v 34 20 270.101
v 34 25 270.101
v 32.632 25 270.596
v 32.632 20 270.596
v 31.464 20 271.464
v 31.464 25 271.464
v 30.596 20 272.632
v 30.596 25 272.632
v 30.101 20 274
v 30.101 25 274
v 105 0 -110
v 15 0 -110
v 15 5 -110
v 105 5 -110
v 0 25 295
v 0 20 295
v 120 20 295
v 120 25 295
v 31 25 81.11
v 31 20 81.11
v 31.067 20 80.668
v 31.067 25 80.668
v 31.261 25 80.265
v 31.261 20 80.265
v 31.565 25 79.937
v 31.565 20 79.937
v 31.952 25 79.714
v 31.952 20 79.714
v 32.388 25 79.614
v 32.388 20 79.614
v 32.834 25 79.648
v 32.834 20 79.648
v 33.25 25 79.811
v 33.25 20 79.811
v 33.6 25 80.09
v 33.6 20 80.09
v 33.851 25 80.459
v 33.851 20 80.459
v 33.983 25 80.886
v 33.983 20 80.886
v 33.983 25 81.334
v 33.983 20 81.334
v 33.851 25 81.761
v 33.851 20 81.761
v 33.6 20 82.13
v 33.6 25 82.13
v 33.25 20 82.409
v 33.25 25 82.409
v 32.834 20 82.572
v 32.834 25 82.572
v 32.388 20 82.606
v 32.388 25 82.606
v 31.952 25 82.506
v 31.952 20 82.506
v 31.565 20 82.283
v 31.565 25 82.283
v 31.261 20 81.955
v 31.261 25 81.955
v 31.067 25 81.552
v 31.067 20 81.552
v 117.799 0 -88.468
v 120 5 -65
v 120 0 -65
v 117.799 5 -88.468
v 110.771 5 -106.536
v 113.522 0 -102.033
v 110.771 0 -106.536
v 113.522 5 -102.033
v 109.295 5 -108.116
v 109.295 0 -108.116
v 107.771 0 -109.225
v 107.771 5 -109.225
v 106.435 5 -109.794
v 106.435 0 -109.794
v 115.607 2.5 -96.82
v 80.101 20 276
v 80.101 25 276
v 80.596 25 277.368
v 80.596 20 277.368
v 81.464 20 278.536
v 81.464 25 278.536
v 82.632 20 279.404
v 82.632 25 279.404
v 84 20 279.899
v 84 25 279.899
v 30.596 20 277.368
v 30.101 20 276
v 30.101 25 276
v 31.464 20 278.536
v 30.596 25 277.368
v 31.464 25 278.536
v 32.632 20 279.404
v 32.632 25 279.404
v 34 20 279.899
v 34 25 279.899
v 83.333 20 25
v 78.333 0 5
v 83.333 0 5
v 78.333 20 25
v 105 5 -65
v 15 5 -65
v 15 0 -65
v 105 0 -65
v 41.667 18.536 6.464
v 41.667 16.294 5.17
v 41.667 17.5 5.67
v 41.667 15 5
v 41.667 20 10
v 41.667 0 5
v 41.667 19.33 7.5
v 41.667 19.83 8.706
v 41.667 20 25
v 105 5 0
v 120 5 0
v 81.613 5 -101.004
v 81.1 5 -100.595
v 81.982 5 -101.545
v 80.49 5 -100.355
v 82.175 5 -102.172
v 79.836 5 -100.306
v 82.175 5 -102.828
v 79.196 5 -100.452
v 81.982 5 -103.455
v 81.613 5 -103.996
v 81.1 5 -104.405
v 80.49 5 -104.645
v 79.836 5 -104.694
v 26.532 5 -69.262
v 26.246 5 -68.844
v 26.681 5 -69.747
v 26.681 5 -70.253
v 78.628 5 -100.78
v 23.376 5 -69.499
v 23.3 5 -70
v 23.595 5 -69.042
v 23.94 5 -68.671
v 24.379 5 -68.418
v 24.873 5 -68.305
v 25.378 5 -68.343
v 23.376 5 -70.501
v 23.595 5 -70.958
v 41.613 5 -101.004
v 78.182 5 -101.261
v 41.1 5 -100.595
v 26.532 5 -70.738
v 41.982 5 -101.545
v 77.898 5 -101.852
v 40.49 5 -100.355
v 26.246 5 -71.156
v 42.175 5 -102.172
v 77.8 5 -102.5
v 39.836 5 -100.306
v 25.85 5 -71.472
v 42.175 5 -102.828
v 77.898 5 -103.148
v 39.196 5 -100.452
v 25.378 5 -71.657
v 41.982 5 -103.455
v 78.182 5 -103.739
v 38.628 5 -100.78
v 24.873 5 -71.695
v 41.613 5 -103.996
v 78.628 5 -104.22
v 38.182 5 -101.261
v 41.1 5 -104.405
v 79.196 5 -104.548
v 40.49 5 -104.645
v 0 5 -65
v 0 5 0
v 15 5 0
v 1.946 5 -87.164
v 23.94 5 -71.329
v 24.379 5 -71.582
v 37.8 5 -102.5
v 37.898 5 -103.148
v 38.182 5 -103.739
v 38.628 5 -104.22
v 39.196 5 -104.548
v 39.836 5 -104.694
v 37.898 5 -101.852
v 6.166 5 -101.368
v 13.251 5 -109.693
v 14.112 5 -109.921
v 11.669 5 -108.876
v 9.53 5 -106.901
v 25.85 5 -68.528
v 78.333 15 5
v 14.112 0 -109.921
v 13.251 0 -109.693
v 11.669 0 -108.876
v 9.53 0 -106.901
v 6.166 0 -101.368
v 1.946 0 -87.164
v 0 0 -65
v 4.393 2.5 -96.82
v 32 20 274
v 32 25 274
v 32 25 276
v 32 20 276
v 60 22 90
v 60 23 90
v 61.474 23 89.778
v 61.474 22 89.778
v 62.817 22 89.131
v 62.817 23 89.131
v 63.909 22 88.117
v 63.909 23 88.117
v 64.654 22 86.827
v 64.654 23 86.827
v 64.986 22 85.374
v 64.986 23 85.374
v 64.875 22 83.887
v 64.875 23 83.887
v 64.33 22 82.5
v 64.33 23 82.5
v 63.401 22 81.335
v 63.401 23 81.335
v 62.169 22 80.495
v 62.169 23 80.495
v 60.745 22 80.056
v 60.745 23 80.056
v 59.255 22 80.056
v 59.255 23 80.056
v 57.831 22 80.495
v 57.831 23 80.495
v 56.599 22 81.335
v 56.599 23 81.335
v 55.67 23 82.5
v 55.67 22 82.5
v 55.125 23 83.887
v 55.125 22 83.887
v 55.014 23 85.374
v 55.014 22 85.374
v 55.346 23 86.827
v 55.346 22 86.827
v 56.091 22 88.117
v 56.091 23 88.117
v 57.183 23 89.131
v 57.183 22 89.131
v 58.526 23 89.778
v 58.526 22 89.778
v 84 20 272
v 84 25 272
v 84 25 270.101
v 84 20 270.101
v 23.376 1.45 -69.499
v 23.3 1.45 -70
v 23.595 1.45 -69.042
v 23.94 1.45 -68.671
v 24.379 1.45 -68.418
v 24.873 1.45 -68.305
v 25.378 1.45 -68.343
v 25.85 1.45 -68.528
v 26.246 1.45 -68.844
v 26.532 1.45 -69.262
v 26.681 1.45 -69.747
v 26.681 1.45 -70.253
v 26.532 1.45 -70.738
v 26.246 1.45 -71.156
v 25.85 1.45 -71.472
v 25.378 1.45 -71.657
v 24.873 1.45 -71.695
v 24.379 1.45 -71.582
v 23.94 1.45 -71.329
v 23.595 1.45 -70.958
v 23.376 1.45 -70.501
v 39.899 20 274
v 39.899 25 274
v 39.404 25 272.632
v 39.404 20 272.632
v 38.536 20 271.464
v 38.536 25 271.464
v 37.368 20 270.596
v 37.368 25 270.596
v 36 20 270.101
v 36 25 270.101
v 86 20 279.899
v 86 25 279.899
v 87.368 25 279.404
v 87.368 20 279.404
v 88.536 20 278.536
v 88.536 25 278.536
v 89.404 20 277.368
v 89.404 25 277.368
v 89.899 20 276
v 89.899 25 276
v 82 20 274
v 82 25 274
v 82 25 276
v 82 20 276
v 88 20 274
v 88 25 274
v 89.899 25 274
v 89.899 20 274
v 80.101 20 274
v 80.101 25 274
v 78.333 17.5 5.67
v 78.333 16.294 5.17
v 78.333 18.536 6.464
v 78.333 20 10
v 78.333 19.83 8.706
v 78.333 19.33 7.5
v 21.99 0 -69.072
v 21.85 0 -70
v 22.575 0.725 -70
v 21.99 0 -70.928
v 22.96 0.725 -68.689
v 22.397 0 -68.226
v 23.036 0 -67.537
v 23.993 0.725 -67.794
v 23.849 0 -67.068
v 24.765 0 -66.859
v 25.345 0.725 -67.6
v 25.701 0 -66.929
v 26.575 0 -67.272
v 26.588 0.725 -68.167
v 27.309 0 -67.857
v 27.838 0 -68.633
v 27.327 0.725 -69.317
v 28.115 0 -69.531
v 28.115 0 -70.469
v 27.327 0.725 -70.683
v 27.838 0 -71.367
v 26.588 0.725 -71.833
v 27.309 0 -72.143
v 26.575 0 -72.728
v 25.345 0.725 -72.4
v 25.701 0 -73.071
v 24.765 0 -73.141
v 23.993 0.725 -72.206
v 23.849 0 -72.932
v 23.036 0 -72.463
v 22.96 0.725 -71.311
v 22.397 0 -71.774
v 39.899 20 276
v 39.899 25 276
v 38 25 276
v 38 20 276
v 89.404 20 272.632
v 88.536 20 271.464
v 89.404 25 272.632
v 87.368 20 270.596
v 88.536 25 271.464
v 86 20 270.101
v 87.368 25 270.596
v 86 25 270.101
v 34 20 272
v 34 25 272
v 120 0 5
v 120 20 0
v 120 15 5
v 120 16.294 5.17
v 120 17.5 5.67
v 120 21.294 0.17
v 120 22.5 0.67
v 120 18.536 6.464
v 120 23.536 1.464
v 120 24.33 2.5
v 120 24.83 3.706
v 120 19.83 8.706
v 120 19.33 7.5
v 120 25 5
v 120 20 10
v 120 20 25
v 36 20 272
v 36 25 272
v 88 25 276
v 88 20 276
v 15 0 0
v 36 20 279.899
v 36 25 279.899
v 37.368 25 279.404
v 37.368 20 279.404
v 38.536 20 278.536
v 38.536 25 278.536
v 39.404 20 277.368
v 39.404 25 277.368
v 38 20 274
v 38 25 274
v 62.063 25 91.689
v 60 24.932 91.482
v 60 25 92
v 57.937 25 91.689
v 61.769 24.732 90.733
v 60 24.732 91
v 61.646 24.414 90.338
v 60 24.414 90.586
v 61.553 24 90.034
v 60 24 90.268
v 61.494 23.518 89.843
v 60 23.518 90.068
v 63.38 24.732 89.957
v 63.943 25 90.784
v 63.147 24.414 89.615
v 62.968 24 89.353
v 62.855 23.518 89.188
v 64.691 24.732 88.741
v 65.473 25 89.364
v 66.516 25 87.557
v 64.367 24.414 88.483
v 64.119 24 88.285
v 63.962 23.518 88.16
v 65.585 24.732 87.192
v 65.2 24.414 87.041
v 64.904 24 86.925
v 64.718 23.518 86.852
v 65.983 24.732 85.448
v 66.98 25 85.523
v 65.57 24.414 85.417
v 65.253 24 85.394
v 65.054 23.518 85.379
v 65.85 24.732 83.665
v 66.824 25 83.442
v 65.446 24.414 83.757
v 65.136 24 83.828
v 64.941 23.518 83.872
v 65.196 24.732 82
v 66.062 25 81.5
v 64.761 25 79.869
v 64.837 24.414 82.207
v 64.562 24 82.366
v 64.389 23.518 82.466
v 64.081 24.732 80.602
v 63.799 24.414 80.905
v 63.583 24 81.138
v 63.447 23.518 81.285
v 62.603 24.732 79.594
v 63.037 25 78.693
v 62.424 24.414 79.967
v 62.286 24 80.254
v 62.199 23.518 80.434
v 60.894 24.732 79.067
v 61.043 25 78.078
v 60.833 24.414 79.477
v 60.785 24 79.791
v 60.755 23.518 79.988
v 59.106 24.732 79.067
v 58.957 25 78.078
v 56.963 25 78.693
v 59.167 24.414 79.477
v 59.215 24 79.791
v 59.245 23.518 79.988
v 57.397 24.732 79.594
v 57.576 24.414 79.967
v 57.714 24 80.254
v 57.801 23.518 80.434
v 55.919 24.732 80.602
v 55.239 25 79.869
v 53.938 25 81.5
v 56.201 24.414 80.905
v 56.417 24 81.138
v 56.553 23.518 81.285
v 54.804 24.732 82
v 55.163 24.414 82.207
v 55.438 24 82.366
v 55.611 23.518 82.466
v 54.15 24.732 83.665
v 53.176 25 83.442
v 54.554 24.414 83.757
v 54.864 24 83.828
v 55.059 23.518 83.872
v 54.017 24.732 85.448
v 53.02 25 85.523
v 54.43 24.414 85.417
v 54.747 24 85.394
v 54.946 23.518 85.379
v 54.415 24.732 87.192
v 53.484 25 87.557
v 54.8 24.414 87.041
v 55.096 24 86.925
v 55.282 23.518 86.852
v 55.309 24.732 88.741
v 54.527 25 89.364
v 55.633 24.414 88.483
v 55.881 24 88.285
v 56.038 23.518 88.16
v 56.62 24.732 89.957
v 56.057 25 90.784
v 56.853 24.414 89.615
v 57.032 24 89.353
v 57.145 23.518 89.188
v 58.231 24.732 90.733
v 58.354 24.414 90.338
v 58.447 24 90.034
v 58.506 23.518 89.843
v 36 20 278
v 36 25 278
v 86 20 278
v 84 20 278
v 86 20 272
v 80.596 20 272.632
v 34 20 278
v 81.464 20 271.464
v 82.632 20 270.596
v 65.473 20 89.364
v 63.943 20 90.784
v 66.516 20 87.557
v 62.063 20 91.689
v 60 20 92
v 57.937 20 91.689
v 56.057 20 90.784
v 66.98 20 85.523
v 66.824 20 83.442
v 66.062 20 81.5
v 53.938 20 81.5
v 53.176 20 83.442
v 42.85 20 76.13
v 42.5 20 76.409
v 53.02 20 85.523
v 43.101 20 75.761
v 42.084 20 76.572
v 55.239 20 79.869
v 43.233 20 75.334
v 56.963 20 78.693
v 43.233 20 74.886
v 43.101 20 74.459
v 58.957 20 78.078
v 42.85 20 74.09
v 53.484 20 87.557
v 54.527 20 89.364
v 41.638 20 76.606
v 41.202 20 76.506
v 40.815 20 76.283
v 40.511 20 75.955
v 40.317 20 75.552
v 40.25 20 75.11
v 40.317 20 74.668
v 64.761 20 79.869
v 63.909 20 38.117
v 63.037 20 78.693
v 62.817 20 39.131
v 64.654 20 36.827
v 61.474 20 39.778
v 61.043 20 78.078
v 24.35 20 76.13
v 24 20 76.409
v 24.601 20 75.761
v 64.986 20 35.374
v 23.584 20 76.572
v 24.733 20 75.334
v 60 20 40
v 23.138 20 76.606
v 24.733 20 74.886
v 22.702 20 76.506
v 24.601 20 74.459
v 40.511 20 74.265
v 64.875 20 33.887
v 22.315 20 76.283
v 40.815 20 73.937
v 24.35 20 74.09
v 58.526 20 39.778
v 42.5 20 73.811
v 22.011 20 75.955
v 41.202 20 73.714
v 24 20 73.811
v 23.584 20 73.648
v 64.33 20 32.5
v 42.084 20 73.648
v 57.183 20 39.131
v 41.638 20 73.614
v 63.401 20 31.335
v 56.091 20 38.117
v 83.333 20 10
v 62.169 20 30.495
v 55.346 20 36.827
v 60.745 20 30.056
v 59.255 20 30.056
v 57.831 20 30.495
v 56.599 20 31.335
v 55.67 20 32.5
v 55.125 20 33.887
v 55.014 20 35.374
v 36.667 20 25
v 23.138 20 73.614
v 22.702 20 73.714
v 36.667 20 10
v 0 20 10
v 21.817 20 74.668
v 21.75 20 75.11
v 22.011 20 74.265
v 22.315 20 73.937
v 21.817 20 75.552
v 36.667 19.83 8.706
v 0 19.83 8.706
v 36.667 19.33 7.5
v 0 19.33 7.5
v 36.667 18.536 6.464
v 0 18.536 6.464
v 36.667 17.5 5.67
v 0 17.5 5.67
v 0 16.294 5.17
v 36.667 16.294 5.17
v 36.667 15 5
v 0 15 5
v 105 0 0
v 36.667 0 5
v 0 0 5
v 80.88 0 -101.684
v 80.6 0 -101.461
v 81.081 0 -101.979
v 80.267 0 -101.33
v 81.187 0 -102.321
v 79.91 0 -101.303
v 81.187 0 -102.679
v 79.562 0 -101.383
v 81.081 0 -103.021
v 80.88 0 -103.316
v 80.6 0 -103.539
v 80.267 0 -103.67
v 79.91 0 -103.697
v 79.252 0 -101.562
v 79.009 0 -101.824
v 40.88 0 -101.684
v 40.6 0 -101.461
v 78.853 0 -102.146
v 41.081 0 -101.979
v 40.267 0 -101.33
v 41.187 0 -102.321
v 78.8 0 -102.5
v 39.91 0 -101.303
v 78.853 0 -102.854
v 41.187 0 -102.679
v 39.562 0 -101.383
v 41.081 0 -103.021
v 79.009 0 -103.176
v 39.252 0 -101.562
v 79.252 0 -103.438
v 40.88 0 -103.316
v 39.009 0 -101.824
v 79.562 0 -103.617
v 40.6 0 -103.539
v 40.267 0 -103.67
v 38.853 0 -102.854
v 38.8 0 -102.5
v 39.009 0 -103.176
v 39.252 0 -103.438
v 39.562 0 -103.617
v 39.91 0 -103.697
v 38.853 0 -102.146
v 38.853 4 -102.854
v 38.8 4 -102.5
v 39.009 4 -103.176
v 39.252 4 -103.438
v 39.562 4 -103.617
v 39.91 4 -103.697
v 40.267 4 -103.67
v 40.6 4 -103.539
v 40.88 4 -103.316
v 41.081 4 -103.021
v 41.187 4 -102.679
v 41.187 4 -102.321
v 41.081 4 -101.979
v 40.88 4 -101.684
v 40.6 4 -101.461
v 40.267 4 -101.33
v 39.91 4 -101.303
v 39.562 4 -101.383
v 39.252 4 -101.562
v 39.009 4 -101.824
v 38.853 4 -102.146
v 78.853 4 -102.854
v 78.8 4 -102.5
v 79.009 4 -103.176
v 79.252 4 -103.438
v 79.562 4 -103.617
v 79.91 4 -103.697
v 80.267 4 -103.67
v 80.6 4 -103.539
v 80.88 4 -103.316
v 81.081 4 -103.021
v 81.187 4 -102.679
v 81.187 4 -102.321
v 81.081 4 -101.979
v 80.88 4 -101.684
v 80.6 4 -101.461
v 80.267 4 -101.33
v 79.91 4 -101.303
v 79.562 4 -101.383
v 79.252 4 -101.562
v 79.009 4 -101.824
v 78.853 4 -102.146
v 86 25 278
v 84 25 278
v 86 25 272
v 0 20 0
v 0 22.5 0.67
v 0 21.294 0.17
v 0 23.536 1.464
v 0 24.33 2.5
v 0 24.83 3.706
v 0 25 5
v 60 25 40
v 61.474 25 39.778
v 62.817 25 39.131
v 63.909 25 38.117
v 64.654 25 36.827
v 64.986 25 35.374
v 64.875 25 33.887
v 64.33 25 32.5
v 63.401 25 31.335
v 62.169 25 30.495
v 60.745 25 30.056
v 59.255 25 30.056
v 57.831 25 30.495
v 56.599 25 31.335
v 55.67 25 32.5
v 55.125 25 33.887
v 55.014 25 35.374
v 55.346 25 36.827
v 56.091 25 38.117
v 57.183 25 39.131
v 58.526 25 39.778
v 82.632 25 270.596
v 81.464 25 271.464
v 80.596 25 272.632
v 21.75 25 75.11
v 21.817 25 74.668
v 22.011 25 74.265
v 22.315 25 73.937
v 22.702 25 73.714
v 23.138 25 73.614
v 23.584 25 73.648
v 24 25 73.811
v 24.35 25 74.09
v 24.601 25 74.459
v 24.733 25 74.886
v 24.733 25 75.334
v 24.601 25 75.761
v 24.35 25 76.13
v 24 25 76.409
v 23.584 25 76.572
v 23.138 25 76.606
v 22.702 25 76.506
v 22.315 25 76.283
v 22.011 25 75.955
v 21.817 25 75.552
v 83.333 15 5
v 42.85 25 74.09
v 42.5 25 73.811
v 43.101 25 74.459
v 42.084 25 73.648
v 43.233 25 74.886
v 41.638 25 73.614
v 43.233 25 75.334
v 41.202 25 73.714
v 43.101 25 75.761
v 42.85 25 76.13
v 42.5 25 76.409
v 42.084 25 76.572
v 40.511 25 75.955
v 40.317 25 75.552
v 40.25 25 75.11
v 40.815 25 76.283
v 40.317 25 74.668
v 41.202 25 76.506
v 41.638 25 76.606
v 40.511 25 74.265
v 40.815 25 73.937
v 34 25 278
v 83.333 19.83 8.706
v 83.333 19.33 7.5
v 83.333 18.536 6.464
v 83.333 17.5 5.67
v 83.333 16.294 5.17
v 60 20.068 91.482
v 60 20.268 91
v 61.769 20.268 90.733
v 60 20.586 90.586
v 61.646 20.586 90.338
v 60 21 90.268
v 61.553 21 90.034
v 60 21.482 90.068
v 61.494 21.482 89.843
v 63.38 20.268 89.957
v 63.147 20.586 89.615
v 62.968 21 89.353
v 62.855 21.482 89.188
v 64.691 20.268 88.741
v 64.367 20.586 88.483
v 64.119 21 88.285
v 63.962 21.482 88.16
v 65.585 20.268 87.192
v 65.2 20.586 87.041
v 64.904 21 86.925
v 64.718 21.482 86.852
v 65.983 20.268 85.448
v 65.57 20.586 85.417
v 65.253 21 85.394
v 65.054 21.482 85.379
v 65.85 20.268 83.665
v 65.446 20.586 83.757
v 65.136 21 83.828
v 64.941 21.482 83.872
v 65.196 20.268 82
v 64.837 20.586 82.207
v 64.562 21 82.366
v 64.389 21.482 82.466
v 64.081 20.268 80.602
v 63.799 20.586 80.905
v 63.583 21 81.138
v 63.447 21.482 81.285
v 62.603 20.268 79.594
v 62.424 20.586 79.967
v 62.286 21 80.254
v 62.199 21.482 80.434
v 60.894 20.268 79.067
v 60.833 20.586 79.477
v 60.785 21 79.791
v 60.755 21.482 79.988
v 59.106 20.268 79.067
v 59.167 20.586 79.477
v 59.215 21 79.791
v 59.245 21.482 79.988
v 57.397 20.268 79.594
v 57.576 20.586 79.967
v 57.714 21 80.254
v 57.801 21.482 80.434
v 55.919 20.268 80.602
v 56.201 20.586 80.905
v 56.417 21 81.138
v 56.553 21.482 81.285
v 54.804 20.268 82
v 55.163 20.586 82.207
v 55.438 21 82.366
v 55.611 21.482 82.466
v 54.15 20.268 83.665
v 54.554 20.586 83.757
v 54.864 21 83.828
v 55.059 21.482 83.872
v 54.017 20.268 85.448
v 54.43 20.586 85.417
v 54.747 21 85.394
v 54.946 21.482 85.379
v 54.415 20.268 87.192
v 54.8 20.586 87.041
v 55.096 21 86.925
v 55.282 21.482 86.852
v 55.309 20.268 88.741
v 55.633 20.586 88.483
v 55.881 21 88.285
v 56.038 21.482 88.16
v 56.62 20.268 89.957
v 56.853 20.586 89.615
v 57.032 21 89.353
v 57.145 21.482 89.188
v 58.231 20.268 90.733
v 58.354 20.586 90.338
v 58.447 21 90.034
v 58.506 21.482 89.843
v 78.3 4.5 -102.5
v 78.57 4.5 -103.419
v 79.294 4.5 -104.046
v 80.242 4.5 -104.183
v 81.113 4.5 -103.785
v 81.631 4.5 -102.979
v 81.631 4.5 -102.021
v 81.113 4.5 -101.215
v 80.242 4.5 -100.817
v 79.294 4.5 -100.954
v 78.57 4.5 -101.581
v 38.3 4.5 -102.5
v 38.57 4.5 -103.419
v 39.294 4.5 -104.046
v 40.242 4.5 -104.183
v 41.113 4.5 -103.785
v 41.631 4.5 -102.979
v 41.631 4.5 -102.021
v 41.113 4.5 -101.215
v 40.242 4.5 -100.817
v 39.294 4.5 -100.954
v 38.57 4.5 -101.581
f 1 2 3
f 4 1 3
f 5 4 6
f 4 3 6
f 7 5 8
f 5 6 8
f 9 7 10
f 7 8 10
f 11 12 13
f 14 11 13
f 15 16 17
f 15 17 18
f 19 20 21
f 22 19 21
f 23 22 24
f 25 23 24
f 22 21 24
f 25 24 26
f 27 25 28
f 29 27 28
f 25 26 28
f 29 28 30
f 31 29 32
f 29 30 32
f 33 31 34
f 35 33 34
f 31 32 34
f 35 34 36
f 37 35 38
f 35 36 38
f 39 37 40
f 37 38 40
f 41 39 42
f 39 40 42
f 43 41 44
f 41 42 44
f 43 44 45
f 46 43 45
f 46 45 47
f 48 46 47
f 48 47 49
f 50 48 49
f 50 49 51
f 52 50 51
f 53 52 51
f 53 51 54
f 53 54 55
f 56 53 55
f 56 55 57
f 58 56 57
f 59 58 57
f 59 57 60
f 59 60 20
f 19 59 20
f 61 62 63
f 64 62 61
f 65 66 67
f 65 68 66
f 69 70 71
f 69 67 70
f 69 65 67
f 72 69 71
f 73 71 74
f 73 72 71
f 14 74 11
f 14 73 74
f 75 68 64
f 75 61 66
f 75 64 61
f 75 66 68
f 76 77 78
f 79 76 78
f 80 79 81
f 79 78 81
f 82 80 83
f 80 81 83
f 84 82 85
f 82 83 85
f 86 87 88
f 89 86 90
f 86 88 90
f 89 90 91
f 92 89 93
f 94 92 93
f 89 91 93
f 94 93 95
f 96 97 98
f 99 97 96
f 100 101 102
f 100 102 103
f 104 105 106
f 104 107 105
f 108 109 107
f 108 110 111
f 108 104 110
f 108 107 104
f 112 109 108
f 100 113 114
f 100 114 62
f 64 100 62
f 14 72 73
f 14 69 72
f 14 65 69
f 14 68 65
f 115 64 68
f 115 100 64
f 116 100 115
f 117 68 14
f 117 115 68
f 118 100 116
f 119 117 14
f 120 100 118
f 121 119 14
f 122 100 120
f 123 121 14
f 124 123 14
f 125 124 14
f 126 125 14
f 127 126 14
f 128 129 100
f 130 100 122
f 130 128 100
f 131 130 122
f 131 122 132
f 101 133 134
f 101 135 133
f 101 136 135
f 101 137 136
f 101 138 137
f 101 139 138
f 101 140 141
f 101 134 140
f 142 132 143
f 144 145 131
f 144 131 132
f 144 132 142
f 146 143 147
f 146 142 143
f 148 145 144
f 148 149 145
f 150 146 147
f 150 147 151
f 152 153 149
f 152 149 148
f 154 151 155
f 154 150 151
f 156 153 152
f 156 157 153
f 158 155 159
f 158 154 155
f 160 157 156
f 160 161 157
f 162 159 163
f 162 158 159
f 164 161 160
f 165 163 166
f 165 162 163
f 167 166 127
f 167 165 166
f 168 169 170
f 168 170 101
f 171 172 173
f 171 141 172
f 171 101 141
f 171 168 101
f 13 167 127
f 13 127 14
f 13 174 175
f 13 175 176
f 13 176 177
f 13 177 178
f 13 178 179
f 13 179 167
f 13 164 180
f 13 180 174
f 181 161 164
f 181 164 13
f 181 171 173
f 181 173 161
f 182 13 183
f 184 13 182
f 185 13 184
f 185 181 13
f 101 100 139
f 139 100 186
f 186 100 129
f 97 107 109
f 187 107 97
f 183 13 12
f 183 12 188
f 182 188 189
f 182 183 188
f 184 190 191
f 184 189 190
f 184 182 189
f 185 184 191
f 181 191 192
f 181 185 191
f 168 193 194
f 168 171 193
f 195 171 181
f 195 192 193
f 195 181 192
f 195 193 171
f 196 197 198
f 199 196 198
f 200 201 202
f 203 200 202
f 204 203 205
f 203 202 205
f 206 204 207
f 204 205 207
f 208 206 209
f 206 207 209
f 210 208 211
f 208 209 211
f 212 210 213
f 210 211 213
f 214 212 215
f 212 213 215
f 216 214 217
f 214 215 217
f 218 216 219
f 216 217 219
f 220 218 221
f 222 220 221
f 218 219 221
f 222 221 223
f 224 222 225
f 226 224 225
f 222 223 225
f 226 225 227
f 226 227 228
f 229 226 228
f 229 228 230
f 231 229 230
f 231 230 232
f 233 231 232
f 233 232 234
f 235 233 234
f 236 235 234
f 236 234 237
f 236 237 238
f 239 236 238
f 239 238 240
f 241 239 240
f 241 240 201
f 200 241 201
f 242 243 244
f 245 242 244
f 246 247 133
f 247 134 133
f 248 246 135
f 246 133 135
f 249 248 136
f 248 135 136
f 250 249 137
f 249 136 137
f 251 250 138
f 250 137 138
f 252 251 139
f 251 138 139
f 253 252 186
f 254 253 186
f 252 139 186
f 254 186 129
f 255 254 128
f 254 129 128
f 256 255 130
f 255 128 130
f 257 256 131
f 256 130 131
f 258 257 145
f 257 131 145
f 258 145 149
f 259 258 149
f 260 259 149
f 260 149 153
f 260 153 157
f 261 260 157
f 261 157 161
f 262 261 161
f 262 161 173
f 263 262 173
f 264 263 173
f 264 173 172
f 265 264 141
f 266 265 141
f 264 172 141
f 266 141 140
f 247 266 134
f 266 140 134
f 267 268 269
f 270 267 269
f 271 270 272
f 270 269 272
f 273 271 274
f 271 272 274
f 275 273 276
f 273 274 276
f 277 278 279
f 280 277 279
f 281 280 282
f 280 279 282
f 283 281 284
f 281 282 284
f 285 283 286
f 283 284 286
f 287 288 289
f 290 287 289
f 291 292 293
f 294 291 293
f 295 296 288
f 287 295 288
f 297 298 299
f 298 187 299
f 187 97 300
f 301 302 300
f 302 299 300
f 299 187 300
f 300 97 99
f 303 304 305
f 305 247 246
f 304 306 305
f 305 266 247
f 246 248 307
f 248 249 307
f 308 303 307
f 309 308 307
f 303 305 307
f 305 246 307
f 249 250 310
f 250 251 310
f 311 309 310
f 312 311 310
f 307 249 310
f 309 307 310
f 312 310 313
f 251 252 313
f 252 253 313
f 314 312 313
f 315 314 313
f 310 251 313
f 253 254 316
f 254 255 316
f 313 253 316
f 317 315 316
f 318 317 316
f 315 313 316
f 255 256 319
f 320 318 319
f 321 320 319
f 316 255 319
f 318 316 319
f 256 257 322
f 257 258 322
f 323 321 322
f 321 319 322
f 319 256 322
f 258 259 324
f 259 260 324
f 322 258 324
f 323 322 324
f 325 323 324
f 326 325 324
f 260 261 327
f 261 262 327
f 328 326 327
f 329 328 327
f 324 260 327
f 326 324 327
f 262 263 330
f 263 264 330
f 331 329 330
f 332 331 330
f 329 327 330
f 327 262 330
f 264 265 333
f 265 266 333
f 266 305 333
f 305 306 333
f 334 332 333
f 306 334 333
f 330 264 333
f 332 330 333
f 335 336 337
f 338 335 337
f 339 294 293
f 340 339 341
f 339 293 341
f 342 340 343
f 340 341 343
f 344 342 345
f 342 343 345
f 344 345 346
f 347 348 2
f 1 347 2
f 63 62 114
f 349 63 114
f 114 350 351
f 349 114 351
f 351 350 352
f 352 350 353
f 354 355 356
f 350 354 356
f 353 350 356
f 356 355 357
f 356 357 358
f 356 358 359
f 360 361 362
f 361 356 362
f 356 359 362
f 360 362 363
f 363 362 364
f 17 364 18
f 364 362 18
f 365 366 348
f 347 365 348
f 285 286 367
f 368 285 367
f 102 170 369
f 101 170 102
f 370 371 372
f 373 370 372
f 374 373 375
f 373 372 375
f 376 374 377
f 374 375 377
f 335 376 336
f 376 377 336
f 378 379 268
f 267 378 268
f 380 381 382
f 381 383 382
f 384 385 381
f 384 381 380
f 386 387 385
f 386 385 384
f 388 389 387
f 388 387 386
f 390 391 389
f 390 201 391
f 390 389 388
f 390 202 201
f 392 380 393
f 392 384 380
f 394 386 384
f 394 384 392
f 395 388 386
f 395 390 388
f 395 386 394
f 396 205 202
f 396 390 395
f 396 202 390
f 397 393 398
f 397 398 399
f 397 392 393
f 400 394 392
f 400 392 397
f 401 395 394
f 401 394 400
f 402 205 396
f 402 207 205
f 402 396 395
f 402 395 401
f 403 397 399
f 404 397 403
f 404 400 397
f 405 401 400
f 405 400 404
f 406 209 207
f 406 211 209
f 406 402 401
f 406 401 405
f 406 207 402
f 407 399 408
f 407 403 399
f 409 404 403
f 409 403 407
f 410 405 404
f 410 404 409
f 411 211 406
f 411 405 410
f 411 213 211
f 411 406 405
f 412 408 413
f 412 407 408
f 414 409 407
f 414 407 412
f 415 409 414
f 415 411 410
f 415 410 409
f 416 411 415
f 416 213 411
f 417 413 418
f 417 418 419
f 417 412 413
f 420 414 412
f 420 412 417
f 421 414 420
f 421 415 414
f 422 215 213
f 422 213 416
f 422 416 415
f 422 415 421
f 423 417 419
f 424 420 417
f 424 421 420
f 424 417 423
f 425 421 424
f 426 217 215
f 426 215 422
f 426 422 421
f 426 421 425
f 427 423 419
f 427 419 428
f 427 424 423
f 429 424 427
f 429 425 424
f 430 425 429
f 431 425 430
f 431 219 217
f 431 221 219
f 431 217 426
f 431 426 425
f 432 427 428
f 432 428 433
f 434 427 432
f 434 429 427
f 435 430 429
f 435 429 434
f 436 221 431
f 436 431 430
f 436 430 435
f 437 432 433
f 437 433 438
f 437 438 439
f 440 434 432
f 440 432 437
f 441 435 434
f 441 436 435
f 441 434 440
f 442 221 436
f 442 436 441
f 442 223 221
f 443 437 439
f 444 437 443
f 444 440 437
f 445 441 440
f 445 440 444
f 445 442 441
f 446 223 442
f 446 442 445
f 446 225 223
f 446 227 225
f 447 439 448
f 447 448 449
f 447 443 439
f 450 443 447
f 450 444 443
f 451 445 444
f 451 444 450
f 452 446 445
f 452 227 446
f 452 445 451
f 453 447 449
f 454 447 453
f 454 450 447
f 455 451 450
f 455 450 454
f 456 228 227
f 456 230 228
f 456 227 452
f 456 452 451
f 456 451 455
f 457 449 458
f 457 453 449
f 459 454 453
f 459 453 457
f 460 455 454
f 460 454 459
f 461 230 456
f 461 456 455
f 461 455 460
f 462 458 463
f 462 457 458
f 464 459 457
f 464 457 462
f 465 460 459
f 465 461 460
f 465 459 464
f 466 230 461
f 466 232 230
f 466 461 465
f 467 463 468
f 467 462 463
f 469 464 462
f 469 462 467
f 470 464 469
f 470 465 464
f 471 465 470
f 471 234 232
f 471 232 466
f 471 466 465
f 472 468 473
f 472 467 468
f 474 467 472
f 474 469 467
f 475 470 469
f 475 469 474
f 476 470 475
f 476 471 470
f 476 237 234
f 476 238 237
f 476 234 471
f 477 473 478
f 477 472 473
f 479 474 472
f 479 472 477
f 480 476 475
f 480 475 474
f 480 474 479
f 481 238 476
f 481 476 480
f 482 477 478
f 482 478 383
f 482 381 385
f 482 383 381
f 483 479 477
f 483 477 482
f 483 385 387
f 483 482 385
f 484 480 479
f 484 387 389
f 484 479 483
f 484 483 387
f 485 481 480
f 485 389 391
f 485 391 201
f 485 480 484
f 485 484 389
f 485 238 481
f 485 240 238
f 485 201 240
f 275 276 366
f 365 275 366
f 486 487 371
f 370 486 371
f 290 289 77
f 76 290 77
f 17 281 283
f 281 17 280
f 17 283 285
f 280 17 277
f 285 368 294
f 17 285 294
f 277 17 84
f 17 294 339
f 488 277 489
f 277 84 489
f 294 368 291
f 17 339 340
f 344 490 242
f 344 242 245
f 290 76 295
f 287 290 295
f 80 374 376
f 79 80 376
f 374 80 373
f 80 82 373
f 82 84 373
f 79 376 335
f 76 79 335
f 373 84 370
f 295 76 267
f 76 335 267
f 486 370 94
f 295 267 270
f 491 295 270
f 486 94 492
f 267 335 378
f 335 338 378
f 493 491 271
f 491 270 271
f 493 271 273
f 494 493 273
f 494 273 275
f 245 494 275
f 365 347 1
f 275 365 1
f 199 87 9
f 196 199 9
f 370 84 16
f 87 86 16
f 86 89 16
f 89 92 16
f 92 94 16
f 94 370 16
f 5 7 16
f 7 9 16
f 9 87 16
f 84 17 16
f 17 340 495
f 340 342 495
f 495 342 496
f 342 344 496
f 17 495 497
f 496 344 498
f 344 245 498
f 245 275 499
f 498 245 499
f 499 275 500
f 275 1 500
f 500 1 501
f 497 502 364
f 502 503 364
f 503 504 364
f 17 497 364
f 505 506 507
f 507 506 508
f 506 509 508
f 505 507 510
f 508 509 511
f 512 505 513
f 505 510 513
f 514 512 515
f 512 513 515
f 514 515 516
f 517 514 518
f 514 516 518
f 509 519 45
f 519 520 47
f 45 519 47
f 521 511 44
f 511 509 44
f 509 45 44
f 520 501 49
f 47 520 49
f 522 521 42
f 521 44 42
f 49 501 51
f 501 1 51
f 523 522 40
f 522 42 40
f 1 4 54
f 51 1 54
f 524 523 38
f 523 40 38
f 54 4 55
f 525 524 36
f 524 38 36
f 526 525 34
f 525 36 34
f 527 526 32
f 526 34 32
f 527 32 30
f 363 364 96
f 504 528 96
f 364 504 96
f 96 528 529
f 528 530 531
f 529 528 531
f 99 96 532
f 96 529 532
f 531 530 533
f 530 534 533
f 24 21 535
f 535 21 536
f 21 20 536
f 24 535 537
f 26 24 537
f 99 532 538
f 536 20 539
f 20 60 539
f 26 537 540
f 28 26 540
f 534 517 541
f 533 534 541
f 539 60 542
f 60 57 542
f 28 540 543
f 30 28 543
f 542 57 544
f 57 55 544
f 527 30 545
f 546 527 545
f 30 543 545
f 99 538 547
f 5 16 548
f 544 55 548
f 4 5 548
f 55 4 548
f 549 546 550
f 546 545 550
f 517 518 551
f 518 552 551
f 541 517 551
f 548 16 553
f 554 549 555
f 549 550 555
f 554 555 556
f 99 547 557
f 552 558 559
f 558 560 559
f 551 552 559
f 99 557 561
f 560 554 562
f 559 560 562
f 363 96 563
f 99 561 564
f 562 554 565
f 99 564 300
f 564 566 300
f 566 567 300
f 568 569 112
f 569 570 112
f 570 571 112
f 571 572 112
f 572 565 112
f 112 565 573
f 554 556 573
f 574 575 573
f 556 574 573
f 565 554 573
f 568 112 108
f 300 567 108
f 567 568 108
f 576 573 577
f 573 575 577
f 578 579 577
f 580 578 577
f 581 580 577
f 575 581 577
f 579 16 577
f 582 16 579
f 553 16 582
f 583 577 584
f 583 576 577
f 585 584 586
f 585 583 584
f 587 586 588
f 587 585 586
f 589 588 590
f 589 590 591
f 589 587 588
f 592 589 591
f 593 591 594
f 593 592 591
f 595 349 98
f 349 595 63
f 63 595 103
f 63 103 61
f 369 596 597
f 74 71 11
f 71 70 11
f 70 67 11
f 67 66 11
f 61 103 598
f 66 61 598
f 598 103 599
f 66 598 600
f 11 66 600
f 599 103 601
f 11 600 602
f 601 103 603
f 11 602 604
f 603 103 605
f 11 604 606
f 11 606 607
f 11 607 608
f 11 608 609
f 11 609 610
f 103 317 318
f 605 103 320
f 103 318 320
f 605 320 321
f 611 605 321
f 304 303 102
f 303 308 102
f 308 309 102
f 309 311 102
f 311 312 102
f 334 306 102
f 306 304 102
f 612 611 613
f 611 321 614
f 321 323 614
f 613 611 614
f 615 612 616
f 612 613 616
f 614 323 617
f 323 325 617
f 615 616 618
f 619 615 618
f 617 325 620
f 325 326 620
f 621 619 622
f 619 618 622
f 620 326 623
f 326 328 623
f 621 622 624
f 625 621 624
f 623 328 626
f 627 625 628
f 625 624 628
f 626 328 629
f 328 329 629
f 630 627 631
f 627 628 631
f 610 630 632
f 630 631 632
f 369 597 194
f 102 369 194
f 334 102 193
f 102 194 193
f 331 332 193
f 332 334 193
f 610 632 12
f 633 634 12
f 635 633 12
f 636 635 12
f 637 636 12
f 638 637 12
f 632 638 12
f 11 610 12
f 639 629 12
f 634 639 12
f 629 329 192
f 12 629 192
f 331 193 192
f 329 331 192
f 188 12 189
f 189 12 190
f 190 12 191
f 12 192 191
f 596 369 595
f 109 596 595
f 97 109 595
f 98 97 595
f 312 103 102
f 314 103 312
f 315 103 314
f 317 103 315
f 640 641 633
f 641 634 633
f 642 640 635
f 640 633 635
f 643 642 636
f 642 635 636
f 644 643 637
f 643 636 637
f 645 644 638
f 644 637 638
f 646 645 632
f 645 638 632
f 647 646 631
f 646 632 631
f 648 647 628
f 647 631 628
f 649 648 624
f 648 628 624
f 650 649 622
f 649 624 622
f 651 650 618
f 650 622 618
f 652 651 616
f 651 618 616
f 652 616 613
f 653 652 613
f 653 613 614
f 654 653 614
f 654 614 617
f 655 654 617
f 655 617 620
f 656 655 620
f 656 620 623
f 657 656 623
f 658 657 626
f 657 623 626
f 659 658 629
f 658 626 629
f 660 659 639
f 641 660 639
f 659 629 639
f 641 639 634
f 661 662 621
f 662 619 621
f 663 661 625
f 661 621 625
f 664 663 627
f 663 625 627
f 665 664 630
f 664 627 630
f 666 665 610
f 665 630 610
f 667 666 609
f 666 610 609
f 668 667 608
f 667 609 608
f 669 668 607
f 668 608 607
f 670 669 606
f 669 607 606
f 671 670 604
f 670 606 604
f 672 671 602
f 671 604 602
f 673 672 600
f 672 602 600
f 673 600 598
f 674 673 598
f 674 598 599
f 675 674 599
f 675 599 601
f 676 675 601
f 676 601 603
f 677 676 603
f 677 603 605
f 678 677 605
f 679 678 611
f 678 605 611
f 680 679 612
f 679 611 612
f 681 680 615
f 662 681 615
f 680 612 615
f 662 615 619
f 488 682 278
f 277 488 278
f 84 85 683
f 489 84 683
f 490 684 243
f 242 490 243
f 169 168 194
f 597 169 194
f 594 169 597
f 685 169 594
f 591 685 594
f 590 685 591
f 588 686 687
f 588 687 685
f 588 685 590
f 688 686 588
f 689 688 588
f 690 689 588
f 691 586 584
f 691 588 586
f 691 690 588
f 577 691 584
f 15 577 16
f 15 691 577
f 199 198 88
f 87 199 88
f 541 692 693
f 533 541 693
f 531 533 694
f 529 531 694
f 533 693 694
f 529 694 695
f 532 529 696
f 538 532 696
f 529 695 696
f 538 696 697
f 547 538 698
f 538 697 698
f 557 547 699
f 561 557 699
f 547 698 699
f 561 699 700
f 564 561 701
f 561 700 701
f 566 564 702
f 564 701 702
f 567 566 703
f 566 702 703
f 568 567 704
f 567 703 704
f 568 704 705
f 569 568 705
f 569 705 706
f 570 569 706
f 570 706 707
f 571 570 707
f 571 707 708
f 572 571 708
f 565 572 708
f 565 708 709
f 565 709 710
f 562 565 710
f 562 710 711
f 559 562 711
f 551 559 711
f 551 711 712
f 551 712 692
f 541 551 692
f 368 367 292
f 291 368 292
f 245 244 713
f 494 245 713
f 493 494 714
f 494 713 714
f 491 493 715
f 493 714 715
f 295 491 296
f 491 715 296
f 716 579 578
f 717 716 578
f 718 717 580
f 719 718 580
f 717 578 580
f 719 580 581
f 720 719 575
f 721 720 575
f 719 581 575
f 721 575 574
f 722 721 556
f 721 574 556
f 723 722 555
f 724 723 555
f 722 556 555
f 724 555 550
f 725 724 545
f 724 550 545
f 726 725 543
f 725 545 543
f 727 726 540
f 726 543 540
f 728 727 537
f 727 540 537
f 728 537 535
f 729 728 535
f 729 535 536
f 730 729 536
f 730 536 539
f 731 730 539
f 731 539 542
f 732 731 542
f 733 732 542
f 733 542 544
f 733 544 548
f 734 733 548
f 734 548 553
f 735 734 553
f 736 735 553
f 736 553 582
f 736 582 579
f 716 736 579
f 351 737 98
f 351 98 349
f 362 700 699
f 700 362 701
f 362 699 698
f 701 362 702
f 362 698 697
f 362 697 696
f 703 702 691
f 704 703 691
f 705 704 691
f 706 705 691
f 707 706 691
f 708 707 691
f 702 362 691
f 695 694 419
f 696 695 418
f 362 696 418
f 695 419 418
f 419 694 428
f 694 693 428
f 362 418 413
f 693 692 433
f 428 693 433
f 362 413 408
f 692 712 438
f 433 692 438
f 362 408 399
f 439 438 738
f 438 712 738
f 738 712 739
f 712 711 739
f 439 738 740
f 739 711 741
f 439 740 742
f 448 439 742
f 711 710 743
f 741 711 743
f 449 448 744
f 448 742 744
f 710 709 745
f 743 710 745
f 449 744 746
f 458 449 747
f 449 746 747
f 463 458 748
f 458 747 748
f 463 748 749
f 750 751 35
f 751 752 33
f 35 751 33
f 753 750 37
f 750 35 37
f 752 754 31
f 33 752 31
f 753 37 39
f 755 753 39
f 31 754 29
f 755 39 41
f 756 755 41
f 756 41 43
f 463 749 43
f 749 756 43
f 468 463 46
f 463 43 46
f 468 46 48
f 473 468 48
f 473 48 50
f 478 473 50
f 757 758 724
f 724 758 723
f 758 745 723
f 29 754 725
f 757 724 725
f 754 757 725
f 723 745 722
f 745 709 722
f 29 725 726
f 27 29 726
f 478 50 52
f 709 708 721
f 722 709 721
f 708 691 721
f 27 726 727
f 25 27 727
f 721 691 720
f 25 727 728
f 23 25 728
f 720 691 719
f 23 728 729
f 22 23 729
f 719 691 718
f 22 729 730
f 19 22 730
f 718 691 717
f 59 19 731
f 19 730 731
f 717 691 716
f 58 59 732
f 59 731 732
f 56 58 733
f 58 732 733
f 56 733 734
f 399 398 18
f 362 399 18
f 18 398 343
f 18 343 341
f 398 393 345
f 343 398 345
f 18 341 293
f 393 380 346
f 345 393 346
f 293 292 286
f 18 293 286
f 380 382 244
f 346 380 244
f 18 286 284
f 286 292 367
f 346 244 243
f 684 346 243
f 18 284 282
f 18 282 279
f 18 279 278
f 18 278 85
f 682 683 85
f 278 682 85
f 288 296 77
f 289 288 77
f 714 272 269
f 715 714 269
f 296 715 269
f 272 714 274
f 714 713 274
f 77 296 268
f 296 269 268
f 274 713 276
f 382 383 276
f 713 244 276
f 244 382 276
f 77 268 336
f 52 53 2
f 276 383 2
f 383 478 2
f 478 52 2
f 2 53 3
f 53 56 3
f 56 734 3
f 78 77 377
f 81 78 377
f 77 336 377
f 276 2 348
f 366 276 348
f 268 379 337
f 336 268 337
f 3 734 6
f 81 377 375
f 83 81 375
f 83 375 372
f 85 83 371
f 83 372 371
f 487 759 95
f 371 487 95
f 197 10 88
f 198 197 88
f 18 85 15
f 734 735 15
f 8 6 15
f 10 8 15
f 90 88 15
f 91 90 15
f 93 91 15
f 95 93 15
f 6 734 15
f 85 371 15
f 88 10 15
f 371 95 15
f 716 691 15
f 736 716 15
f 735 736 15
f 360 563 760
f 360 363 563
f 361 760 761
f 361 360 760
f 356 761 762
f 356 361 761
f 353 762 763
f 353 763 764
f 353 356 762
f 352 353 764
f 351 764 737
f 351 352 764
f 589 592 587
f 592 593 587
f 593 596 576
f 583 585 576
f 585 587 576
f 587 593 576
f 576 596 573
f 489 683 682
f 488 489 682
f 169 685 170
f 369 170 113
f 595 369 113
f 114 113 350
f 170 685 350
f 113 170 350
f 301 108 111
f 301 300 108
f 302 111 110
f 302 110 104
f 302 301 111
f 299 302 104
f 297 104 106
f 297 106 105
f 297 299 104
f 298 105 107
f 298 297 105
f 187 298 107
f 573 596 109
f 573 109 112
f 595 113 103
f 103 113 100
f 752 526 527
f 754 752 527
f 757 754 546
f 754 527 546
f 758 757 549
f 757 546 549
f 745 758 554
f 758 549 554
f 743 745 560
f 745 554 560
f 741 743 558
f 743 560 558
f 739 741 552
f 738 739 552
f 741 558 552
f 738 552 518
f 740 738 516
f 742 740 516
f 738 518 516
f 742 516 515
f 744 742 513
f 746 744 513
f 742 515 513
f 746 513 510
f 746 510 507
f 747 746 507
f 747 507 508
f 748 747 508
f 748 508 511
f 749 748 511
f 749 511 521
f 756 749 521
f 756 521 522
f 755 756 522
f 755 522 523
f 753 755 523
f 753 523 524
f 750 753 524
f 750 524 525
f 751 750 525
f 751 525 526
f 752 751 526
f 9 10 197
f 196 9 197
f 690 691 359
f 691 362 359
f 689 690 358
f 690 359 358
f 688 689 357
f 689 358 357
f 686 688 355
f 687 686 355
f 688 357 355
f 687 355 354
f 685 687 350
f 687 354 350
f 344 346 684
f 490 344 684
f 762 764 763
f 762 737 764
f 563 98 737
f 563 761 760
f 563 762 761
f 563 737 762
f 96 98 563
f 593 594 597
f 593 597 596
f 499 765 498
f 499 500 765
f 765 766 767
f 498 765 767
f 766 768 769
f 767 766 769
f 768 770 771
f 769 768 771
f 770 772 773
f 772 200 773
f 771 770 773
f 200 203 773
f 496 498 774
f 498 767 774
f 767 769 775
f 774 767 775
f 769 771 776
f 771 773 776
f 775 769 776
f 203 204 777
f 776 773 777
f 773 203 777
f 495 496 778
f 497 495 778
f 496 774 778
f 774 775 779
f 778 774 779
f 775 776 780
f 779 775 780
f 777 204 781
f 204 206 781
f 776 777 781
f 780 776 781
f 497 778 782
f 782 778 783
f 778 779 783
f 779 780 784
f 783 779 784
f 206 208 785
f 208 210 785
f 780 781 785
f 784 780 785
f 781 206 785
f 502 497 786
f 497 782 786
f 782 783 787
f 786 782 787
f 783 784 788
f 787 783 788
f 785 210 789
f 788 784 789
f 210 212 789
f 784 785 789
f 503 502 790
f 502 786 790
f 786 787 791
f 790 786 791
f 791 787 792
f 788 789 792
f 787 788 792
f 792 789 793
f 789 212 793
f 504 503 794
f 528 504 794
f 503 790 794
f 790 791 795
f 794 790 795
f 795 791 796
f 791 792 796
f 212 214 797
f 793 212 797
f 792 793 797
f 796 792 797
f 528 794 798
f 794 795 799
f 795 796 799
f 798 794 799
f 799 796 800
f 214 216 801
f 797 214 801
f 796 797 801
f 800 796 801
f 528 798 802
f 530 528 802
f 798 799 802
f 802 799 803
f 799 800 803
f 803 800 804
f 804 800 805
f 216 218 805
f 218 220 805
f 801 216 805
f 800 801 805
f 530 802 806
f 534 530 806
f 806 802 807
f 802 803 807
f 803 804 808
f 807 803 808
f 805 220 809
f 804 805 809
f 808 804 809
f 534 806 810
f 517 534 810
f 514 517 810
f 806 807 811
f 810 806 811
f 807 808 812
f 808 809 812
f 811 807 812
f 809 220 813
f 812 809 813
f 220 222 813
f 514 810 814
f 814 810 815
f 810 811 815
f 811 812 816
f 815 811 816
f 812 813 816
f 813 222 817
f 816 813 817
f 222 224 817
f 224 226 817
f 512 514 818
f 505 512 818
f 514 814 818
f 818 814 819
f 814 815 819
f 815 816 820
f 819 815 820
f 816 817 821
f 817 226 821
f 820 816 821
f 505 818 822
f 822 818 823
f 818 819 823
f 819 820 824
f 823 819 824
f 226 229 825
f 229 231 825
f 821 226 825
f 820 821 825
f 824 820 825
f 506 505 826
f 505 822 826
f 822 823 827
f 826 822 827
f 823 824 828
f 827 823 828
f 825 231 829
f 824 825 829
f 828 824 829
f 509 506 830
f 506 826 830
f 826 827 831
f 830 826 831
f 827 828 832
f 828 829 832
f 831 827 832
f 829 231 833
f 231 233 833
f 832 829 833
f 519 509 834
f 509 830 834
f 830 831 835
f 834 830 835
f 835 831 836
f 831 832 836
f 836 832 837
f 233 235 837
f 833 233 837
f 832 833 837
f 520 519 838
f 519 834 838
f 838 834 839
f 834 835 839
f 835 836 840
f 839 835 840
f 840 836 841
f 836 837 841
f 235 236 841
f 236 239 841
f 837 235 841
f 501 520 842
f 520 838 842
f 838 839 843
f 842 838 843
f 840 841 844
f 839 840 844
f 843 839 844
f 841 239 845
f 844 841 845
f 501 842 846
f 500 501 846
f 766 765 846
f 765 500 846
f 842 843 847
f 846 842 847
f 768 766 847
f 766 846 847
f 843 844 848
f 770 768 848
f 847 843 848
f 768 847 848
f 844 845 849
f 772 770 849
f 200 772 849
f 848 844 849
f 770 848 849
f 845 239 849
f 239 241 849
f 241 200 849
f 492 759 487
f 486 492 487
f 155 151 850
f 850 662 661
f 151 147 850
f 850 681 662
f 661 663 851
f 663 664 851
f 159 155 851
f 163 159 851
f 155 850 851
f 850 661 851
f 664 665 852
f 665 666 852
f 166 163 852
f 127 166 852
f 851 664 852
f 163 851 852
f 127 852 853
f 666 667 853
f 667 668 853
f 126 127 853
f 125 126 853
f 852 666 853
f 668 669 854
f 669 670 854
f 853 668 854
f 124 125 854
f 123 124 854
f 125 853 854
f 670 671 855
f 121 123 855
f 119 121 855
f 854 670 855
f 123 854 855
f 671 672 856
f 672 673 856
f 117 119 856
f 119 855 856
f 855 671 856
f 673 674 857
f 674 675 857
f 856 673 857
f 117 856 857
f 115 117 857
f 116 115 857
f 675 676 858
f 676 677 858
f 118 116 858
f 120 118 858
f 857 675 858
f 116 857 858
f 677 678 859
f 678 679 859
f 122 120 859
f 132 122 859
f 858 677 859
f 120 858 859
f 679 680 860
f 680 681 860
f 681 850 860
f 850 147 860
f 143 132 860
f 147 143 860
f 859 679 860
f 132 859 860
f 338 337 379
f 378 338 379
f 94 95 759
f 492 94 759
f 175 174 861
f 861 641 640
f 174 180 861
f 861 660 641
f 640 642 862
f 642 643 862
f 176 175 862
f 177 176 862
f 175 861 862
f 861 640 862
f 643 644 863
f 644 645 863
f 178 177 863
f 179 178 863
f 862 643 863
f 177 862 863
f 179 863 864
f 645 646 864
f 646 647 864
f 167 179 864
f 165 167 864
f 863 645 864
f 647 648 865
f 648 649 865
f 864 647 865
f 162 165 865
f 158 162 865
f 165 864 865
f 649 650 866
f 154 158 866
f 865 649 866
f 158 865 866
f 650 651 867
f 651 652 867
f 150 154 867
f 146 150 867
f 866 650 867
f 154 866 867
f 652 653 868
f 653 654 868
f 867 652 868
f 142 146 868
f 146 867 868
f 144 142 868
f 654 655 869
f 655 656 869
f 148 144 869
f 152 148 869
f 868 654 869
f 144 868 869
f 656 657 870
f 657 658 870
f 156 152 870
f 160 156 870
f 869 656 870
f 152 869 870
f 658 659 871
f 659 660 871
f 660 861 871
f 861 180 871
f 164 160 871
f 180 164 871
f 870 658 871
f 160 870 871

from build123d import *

# Parameters (mm, degrees)
SKETCH1_W                                       = 5
SKETCH1_H                                       = 25
SKETCH1_W_2                                     = 110
SKETCH1_H_2                                     = 5
SKETCH1_W_3                                     = 290
BOSS_EXTRUDE1_DEPTH                             = 120
SKETCH2_W                                       = 90
SKETCH2_H                                       = 65
SKETCH2_R                                       = 5
CUT_EXTRUDE1_DEPTH                              = 320.452656899
CSK_FOR_M2_FLAT_HEAD_MACHINE_SCREW1_D           = 2.4
CSK_FOR_M2_FLAT_HEAD_MACHINE_SCREW1_CSINK_D     = 4.4
CSK_FOR_M2_FLAT_HEAD_MACHINE_SCREW1_CSINK_ANGLE = 90
F_3_0MM_DOWEL_HOLE1_D                           = 3
BOSS_EXTRUDE2_DEPTH                             = 120
SKETCH10_W                                      = 36.666666667
SKETCH10_H                                      = 20
SKETCH10_W_2                                    = 36.666666666
CUT_EXTRUDE2_DEPTH                              = 290
FILLET1_R                                       = 5
CSK_FOR_M3_FLAT_HEAD_MACHINE_SCREW1_D           = 3.4
CSK_FOR_M3_FLAT_HEAD_MACHINE_SCREW1_DEPTH       = 5
CSK_FOR_M3_FLAT_HEAD_MACHINE_SCREW1_CSINK_D     = 6.3
CSK_FOR_M3_FLAT_HEAD_MACHINE_SCREW1_CSINK_ANGLE = 90
CSK_FOR_M3_FLAT_HEAD_MACHINE_SCREW1_TIP         = 1.021463052
FILLET2_R                                       = 2


with BuildPart() as part:
    # Sketch1 → Boss-Extrude1 (new body)
    with BuildSketch(Plane(origin=(0, 0, 0), x_dir=(0, 0, -1), z_dir=(1, 0, 0))):
        with Locations((-2.5, 12.5)):
            Rectangle(SKETCH1_W, SKETCH1_H)
        with Locations((55, 2.5)):
            Rectangle(SKETCH1_W_2, SKETCH1_H_2)
        with Locations((-150, 22.5)):
            Rectangle(SKETCH1_W_3, SKETCH1_H_2)
    extrude(amount=BOSS_EXTRUDE1_DEPTH)

    # Sketch2 → Cut-Extrude1 (cut, through all)
    with BuildSketch(Plane(origin=(0, 25, 0), x_dir=(1, 0, 0), z_dir=(0, 1, 0))):
        with BuildLine():
            Line((34, -272), (34, -270.101020514))
            ThreePointArc((34, -270.101020514), (31.464466094, -271.464466094), (30.101020514, -274))
            Line((30.101020514, -274), (32, -274))
            Line((32, -274), (32, -276))
            Line((32, -276), (30.101020514, -276))
            ThreePointArc((30.101020514, -276), (31.464466094, -278.535533906), (34, -279.898979486))
            Line((34, -279.898979486), (34, -278))
            Line((34, -278), (36, -278))
            Line((36, -278), (36, -279.898979486))
            ThreePointArc((36, -279.898979486), (38.535533906, -278.535533906), (39.898979486, -276))
            Line((39.898979486, -276), (38, -276))
            Line((38, -276), (38, -274))
            Line((38, -274), (39.898979486, -274))
            ThreePointArc((39.898979486, -274), (38.535533906, -271.464466094), (36, -270.101020514))
            Line((36, -270.101020514), (36, -272))
            Line((36, -272), (34, -272))
        make_face()
        with BuildLine():
            Line((84, -272), (84, -270.101020514))
            ThreePointArc((84, -270.101020514), (81.464466094, -271.464466094), (80.101020514, -274))
            Line((80.101020514, -274), (82, -274))
            Line((82, -274), (82, -276))
            Line((82, -276), (80.101020514, -276))
            ThreePointArc((80.101020514, -276), (81.464466094, -278.535533906), (84, -279.898979486))
            Line((84, -279.898979486), (84, -278))
            Line((84, -278), (86, -278))
            Line((86, -278), (86, -279.898979486))
            ThreePointArc((86, -279.898979486), (88.535533906, -278.535533906), (89.898979486, -276))
            Line((89.898979486, -276), (88, -276))
            Line((88, -276), (88, -274))
            Line((88, -274), (89.898979486, -274))
            ThreePointArc((89.898979486, -274), (88.535533906, -271.464466094), (86, -270.101020514))
            Line((86, -270.101020514), (86, -272))
            Line((86, -272), (84, -272))
        make_face()
        with Locations((60, 32.5)):
            Rectangle(SKETCH2_W, SKETCH2_H)
        with BuildLine():
            Line((-14.667196701, 131.62219227), (15, 110))
            add(Edge.make_bspline(
                [(15, 110), (0, 110), (0, 65)],
                knots=[0, 0, 0, 1.570796327, 1.570796327, 1.570796327], degree=2, weights=[1, 0.707106781, 1]))
            Line((0, 65), (-14.667196701, 131.62219227))
        make_face()
        with BuildLine():
            add(Edge.make_bspline(
                [(120, 65), (120, 110), (105, 110)],
                knots=[4.71238898, 4.71238898, 4.71238898, 6.283185307, 6.283185307, 6.283185307], degree=2, weights=[1, 0.707106781, 1]))
            Line((105, 110), (141.916619914, 126.007078186))
            Line((141.916619914, 126.007078186), (120, 65))
        make_face()
        with Locations(Location((60, -35, 0), (0, 0, 270))):
            Circle(SKETCH2_R)
        with Locations(Location((60, -85, 0), (0, 0, 270))):
            Circle(SKETCH2_R)
    extrude(amount=-CUT_EXTRUDE1_DEPTH, mode=Mode.SUBTRACT)

    # CSK for M2 Flat Head Machine Screw1 (through all)
    with Locations(Plane(origin=(0, 5, 0), x_dir=(1, 0, 0), z_dir=(0, 1, 0))):
        with Locations((40, 102.5), (80, 102.5)):
            CounterSinkHole(CSK_FOR_M2_FLAT_HEAD_MACHINE_SCREW1_D / 2, CSK_FOR_M2_FLAT_HEAD_MACHINE_SCREW1_CSINK_D / 2, counter_sink_angle=CSK_FOR_M2_FLAT_HEAD_MACHINE_SCREW1_CSINK_ANGLE)

    # Ø3.0mm Dowel Hole1 (through all)
    with Locations(Plane(origin=(0, 25, 0), x_dir=(1, 0, 0), z_dir=(0, 1, 0))):
        with Locations((23.25, -75.11), (32.5, -81.11), (41.75, -75.11)):
            Hole(F_3_0MM_DOWEL_HOLE1_D / 2)

    # Sketch9 → Boss-Extrude2 (add)
    with BuildSketch(Plane.ZY):
        Polygon((5, 0), (25, 20), (5, 20), align=None)
    extrude(amount=-BOSS_EXTRUDE2_DEPTH)

    # Sketch10 → Cut-Extrude2 (cut)
    with BuildSketch(Plane.XY.offset(295)):
        with Locations((18.333333334, 10)):
            Rectangle(SKETCH10_W, SKETCH10_H)
        with Locations((60, 10)):
            Rectangle(SKETCH10_W_2, SKETCH10_H)
        with Locations((101.666666667, 10)):
            Rectangle(SKETCH10_W, SKETCH10_H)
    extrude(amount=-CUT_EXTRUDE2_DEPTH, mode=Mode.SUBTRACT)

    # Fillet1
    fillet1_edges = [part.edges().sort_by_distance(p)[0] for p in [
        (60, 25, 0),
        (18.333333333, 20, 5),
        (60, 20, 5),
        (101.666666667, 20, 5),
    ]]
    fillet(fillet1_edges, radius=FILLET1_R)

    # CSK for M3 Flat Head Machine Screw1
    with Locations(Plane.XZ):
        with Locations((25, -70)):
            CounterSinkHole(CSK_FOR_M3_FLAT_HEAD_MACHINE_SCREW1_D / 2, CSK_FOR_M3_FLAT_HEAD_MACHINE_SCREW1_CSINK_D / 2, depth=CSK_FOR_M3_FLAT_HEAD_MACHINE_SCREW1_DEPTH, counter_sink_angle=CSK_FOR_M3_FLAT_HEAD_MACHINE_SCREW1_CSINK_ANGLE)
            with Locations((0, 0, -(CSK_FOR_M3_FLAT_HEAD_MACHINE_SCREW1_DEPTH + CSK_FOR_M3_FLAT_HEAD_MACHINE_SCREW1_TIP / 2))):  # 118° drill point
                Cone(0, CSK_FOR_M3_FLAT_HEAD_MACHINE_SCREW1_D / 2, CSK_FOR_M3_FLAT_HEAD_MACHINE_SCREW1_TIP, mode=Mode.SUBTRACT)

    # Fillet2
    fillet2_edges = [part.edges().sort_by_distance(p)[0] for p in [
        (60, 20, 80),
        (60, 25, 80),
    ]]
    fillet(fillet2_edges, radius=FILLET2_R)


solid = part.part
